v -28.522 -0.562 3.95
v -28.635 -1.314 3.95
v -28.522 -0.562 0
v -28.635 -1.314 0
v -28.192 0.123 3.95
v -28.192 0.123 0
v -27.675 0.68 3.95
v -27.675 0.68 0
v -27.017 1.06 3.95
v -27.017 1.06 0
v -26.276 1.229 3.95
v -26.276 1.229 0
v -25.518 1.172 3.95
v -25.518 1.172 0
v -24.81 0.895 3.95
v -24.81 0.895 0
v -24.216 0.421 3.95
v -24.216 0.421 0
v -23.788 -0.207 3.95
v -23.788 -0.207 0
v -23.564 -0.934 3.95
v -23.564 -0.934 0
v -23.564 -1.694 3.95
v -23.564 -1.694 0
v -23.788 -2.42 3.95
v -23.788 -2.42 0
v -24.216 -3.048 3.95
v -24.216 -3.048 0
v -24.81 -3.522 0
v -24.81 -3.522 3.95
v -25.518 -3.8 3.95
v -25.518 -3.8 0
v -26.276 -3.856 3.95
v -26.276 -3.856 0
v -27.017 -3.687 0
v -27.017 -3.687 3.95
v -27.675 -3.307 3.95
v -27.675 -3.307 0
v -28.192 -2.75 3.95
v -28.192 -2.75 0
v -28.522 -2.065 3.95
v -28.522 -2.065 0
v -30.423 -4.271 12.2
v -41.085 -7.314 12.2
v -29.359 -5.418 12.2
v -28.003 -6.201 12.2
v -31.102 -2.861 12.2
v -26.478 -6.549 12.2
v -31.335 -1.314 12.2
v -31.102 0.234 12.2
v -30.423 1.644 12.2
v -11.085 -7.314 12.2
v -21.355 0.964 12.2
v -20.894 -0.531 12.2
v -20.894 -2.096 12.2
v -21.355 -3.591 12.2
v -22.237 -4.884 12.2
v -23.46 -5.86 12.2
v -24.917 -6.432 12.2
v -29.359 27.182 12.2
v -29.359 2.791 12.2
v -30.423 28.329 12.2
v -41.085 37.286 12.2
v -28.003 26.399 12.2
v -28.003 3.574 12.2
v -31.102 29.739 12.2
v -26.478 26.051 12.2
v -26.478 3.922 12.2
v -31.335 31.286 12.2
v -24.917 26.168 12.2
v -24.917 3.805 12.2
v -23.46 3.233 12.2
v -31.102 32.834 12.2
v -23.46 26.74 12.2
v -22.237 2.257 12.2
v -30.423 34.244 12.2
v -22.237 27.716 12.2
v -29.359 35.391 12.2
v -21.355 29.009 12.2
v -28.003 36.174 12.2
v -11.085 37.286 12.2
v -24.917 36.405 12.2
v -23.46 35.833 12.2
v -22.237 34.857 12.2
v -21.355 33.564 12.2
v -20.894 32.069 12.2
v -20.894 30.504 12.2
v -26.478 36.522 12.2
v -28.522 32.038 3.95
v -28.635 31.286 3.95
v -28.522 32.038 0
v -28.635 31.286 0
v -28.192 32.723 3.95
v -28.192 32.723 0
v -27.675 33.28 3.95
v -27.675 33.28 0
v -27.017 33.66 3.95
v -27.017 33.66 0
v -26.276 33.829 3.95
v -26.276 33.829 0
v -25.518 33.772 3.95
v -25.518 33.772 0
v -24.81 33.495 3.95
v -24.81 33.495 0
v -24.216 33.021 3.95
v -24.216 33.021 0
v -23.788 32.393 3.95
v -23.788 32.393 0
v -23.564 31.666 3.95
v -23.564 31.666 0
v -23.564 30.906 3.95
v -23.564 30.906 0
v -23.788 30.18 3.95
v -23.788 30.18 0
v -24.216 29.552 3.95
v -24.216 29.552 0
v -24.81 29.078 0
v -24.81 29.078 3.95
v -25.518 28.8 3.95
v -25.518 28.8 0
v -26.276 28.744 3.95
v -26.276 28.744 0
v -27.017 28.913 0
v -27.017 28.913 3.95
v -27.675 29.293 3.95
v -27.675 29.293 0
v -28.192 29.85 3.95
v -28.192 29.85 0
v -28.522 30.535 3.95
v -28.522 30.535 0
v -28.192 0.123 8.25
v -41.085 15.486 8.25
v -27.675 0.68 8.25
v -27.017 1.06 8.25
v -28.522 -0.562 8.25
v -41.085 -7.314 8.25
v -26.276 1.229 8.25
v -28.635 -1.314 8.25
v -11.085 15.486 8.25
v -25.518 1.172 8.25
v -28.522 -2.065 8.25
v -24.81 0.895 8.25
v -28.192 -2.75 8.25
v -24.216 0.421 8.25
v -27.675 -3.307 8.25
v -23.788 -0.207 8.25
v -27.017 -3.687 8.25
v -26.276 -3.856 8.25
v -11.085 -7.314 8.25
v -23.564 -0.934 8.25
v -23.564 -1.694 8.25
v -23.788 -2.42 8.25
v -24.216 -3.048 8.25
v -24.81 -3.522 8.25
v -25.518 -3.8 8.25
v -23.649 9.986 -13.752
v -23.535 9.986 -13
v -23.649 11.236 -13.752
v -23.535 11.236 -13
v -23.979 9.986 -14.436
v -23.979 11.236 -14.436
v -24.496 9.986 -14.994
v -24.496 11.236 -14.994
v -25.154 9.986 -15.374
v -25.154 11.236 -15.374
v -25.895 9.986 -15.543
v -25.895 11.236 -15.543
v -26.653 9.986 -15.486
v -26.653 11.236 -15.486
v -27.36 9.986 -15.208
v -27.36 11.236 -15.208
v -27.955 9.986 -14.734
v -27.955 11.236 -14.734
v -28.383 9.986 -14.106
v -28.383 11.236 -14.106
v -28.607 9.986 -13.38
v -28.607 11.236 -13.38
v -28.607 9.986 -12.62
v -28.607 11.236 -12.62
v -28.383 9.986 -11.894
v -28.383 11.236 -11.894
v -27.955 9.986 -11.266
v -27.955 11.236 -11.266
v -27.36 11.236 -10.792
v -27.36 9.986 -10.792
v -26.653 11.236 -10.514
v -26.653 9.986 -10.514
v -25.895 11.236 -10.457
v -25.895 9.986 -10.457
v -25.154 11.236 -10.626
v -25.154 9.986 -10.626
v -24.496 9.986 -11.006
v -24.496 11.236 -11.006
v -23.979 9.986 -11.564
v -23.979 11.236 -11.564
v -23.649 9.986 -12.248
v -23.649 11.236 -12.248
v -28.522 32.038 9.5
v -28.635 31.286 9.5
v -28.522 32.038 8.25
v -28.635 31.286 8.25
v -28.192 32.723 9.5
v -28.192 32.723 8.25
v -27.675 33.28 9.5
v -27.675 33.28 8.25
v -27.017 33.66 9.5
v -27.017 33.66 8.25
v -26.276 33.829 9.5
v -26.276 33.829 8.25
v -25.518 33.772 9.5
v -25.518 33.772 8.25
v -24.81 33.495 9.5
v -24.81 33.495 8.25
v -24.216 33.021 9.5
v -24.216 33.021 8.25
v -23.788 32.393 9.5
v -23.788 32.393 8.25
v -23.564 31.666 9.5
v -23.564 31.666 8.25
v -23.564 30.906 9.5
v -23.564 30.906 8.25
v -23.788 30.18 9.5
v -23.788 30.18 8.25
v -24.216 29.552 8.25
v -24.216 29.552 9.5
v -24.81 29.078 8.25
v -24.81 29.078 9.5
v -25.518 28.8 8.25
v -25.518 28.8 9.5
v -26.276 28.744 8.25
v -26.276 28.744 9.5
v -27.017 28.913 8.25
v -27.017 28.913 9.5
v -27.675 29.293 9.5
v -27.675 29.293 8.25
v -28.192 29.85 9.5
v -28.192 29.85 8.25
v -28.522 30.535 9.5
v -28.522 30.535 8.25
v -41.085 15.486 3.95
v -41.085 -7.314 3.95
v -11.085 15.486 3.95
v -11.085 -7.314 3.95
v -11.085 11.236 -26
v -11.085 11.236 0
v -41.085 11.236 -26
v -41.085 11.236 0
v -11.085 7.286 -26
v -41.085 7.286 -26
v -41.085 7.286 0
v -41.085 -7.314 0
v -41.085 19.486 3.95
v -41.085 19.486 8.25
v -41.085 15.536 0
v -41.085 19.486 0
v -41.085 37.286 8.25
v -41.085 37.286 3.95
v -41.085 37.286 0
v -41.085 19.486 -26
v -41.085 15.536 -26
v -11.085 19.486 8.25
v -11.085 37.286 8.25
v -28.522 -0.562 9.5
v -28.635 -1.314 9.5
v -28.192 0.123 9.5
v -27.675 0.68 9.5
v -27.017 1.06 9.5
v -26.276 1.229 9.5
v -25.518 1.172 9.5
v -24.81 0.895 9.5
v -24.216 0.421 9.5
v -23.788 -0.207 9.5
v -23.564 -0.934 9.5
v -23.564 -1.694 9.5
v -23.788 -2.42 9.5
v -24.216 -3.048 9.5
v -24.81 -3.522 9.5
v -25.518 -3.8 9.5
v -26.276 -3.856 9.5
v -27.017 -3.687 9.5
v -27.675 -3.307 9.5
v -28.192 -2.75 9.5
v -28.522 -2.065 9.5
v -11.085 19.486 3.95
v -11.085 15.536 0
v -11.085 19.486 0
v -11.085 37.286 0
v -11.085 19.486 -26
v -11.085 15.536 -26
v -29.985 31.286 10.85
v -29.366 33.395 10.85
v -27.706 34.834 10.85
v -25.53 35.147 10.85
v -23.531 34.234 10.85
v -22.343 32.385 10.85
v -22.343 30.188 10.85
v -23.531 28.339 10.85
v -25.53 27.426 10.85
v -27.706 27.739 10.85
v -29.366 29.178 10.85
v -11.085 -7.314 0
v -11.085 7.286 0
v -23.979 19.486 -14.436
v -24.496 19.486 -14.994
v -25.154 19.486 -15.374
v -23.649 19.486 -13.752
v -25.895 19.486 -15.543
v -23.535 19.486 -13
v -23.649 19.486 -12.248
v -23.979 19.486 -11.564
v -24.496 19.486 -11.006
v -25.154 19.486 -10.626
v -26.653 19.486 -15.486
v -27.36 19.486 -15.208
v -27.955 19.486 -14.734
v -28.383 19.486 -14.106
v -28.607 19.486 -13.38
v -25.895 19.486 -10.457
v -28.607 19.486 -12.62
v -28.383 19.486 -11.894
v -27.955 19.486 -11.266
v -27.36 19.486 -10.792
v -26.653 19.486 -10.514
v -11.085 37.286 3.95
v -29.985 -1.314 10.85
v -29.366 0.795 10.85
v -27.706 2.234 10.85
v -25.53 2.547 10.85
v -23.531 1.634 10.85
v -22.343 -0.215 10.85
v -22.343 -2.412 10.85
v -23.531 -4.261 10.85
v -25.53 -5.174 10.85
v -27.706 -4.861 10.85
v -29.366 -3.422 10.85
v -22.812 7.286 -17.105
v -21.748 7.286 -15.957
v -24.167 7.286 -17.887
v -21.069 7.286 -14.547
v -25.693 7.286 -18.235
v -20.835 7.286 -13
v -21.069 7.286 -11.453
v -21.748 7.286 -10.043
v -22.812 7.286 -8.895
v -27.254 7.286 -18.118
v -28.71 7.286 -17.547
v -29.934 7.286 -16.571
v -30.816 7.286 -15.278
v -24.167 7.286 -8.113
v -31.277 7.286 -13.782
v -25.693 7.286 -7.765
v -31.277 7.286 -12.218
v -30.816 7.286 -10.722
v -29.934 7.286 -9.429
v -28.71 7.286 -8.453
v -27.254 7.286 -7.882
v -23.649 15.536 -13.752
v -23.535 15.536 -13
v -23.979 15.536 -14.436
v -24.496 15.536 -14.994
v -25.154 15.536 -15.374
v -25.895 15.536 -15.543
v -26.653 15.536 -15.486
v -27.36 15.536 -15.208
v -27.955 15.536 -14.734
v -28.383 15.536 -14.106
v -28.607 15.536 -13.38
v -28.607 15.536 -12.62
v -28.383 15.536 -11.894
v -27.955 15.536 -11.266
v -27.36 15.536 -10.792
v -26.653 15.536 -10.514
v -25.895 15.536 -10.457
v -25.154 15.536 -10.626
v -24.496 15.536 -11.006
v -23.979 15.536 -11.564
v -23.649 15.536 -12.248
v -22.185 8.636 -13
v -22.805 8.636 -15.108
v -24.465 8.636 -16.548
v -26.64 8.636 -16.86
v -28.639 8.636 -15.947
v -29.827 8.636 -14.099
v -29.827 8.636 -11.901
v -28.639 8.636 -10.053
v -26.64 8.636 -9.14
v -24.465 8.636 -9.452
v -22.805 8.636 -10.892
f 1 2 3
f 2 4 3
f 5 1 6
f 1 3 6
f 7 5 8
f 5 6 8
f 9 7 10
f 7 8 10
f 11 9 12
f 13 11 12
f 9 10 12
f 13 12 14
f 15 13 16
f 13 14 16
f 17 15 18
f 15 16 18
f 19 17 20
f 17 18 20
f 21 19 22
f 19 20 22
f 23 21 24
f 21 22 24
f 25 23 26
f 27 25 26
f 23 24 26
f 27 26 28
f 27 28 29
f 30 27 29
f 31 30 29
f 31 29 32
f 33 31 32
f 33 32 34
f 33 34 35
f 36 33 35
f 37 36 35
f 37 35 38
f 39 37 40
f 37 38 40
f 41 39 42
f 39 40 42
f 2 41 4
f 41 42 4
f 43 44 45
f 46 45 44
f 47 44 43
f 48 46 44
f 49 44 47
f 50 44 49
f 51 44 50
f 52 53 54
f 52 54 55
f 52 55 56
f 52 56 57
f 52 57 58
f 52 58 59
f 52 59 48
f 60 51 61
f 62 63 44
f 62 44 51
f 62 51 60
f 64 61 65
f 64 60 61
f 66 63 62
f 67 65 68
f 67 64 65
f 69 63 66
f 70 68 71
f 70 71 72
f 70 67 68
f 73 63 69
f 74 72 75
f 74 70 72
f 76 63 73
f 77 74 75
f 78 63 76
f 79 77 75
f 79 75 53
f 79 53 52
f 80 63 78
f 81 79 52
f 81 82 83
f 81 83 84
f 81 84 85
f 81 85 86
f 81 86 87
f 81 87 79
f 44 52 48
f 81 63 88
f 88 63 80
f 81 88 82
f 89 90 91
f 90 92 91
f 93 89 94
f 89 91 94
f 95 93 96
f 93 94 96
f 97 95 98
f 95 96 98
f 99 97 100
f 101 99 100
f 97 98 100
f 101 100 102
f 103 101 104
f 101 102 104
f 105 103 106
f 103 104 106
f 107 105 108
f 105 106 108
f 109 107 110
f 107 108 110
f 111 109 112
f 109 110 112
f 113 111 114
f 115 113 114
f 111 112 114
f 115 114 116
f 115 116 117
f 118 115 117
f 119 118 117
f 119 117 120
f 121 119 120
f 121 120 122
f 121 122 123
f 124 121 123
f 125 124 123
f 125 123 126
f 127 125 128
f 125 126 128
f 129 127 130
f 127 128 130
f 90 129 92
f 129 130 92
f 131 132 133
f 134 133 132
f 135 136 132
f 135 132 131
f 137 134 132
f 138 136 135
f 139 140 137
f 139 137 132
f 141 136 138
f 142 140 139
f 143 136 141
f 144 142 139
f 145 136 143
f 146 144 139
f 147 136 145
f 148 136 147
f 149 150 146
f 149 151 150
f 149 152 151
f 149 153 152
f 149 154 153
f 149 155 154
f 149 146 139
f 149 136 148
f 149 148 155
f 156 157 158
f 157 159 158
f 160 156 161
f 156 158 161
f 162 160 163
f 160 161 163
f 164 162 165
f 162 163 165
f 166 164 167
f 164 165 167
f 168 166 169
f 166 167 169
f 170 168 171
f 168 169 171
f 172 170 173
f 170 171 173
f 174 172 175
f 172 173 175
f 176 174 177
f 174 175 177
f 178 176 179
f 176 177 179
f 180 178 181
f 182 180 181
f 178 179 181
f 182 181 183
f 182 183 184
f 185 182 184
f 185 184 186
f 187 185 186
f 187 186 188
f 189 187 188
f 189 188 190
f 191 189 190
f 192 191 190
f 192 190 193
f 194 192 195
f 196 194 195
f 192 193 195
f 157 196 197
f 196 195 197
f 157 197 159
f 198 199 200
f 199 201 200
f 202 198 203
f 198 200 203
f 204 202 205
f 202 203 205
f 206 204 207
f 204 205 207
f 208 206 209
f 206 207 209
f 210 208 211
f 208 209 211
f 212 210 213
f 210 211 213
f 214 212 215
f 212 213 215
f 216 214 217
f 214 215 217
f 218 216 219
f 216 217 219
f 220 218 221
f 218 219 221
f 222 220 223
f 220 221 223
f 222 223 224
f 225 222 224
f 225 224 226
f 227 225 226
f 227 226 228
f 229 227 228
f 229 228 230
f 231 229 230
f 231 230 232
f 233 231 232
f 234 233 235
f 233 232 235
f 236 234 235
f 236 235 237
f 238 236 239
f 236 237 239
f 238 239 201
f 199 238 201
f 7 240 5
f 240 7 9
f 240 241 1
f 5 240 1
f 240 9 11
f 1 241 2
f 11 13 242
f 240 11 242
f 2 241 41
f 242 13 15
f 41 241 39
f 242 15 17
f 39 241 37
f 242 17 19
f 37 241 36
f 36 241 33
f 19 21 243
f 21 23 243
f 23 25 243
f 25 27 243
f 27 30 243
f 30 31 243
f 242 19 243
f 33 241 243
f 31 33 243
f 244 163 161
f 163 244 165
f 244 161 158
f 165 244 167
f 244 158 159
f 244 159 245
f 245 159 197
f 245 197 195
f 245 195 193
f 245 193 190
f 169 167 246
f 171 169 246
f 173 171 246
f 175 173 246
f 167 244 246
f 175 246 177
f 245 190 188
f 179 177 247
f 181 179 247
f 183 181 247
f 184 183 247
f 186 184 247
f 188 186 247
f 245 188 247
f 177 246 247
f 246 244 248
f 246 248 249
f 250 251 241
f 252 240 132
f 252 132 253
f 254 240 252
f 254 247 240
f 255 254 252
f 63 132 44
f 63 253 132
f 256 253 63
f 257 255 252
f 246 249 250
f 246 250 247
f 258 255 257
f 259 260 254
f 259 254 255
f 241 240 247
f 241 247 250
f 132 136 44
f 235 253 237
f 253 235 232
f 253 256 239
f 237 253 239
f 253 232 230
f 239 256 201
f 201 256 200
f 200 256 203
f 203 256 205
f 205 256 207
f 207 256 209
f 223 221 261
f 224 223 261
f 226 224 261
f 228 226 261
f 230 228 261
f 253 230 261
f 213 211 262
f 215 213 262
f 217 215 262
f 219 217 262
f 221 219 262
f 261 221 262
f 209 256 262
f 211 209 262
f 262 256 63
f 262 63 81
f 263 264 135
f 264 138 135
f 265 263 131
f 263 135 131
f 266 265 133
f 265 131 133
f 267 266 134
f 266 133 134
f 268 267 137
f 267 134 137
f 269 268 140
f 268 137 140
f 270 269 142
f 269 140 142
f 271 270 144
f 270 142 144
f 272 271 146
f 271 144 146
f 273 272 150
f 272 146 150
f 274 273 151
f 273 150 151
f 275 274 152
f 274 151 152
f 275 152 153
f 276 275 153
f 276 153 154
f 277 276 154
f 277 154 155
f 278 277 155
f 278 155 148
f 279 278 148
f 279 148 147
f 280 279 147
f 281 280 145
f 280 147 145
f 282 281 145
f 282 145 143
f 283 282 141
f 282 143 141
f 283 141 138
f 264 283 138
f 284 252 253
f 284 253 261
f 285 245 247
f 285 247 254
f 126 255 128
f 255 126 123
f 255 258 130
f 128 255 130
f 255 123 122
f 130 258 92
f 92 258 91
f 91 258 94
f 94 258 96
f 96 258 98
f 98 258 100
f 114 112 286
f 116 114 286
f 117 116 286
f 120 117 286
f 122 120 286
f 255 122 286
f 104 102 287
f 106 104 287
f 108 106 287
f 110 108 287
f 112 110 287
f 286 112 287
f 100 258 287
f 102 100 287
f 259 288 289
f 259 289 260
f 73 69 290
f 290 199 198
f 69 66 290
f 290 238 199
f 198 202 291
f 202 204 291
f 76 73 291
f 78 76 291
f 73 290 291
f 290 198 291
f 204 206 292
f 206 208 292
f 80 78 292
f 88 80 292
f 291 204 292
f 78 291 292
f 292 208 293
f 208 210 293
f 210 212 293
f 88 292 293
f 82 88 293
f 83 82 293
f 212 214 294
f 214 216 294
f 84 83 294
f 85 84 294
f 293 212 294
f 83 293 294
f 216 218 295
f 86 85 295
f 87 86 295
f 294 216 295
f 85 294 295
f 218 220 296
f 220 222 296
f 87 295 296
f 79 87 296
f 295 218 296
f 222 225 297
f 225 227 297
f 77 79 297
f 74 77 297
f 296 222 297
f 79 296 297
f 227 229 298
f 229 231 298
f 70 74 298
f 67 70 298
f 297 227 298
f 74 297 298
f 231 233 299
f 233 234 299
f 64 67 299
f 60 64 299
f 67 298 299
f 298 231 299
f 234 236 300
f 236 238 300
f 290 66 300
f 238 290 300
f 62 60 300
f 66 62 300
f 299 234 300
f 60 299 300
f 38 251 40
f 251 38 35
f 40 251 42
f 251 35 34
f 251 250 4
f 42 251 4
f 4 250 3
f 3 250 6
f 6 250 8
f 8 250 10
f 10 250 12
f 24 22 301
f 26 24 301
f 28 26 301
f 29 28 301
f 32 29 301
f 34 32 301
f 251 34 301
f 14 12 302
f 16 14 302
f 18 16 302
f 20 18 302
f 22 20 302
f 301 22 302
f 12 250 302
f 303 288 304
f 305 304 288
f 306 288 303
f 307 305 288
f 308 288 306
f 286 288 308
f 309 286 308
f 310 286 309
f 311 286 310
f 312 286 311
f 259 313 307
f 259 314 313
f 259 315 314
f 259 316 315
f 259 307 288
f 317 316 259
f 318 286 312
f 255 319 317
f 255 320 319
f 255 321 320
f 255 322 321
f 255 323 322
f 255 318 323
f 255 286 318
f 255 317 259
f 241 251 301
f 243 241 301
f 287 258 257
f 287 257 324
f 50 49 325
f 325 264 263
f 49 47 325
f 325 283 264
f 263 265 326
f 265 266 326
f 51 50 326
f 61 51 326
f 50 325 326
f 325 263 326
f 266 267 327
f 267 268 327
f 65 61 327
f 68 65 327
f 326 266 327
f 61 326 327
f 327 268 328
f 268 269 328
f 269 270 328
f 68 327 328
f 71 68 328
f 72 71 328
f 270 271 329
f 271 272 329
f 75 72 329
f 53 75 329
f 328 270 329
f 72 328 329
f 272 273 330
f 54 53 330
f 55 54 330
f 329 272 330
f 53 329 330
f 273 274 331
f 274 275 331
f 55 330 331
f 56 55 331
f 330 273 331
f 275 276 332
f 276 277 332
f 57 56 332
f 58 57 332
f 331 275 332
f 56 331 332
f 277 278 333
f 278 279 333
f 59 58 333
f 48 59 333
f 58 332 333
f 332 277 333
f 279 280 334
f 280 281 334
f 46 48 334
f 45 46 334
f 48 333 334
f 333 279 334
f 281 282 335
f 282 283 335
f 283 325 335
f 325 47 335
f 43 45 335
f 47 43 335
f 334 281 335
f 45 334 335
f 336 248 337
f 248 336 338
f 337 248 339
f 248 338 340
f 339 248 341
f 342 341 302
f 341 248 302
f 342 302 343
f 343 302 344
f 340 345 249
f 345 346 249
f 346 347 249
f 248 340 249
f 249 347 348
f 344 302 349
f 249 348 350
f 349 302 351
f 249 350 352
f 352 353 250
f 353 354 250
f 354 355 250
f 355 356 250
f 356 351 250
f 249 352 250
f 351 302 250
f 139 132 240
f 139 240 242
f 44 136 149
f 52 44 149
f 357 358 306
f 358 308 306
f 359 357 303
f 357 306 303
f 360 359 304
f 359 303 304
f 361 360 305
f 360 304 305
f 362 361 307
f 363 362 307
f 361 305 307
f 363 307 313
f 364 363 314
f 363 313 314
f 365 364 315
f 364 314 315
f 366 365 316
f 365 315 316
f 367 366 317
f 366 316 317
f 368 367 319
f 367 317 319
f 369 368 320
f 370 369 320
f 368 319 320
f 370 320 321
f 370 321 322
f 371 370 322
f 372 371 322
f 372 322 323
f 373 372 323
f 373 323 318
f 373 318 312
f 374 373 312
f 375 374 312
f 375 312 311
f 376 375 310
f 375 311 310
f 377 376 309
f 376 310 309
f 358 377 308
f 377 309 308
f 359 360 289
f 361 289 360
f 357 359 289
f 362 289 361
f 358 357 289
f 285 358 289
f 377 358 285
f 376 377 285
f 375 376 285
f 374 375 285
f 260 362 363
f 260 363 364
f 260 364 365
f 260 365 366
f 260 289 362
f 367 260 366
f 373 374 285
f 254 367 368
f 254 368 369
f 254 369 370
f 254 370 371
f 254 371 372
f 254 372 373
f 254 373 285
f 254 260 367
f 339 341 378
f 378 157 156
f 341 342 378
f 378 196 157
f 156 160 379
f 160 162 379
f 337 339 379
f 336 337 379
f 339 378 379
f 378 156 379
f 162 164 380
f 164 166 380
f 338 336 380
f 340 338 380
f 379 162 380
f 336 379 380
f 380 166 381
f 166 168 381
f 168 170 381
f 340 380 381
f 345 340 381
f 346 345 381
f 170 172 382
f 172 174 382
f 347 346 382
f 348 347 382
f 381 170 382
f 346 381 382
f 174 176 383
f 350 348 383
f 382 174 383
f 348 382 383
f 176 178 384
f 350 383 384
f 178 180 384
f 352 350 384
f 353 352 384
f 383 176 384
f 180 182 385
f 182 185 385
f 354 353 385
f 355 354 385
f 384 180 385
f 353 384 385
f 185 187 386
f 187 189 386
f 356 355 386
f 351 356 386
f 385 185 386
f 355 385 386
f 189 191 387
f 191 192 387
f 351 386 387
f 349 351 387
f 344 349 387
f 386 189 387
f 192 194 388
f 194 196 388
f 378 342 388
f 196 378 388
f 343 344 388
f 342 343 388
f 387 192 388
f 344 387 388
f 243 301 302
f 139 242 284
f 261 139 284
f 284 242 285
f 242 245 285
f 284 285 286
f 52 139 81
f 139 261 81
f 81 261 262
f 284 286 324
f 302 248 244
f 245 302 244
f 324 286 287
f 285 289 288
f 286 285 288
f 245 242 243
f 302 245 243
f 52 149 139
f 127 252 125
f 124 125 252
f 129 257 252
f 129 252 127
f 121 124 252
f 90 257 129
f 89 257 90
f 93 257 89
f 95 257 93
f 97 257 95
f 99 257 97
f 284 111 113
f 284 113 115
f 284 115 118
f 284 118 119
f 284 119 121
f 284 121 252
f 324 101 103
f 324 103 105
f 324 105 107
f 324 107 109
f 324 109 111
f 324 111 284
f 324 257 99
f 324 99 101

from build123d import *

# Parameters (mm, degrees)
ESQUISSE1_W                                       = 30
ESQUISSE1_H                                       = 44.6
BOSS_EXTRU_1_DEPTH                                = 12.2
ESQUISSE2_W                                       = 30
ESQUISSE2_H                                       = 4.3
ENL_V_MAT_EXTRU_1_DEPTH                           = 17.8
ESQUISSE3_W                                       = 30
ESQUISSE3_H                                       = 4.3
ENL_V_MAT_EXTRU_2_DEPTH                           = 22.8
FRAISAGE_POUR_VIS_T_TE_FRAIS_E_BOMB_E_D           = 5.09999996
FRAISAGE_POUR_VIS_T_TE_FRAIS_E_BOMB_E_CSINK_D     = 10.500000082
FRAISAGE_POUR_VIS_T_TE_FRAIS_E_BOMB_E_CSINK_ANGLE = 90
ESQUISSE6_W                                       = 30
ESQUISSE6_H                                       = 12.2
BOSS_EXTRU_2_DEPTH                                = 26
ESQUISSE7_W                                       = 26
ESQUISSE7_H                                       = 4.3
ENL_V_MAT_EXTRU_3_DEPTH                           = 31
FRAISAGE_POUR_VIS_T_TE_FRAIS_E_BOM_2_D            = 5.09999996
FRAISAGE_POUR_VIS_T_TE_FRAIS_E_BOM_2_CSINK_D      = 10.500000082
FRAISAGE_POUR_VIS_T_TE_FRAIS_E_BOM_2_CSINK_ANGLE  = 90


with BuildPart() as part:
    # Esquisse1 → Boss.-Extru.1 (new body)
    with BuildSketch(Plane.XY):
        with Locations((-26.085427136, 14.986432161)):
            Rectangle(ESQUISSE1_W, ESQUISSE1_H)
    extrude(amount=BOSS_EXTRU_1_DEPTH)

    # Esquisse2 → Enlèv. mat.-Extru.1 (cut)
    with BuildSketch(Plane(origin=(0, 37.286432161, 0), x_dir=(1, 0, 0), z_dir=(0, 1, 0))):
        with Locations((-26.085427136, -6.1)):
            Rectangle(ESQUISSE2_W, ESQUISSE2_H)
    extrude(amount=-ENL_V_MAT_EXTRU_1_DEPTH, mode=Mode.SUBTRACT)

    # Esquisse3 → Enlèv. mat.-Extru.2 (cut)
    with BuildSketch(Plane.XZ.offset(7.313567839)):
        with Locations((-26.085427136, 6.1)):
            Rectangle(ESQUISSE3_W, ESQUISSE3_H)
    extrude(amount=-ENL_V_MAT_EXTRU_2_DEPTH, mode=Mode.SUBTRACT)

    # Fraisage pour vis _ t_te frais_e bomb_e (through all)
    with Locations(Plane(origin=(-26.085427136, -1.313567839, 12.2), x_dir=(1, 0, 0), z_dir=(0, 0, 1))):
        with Locations((0, 0), (0, 32.6)):
            CounterSinkHole(FRAISAGE_POUR_VIS_T_TE_FRAIS_E_BOMB_E_D / 2, FRAISAGE_POUR_VIS_T_TE_FRAIS_E_BOMB_E_CSINK_D / 2, counter_sink_angle=FRAISAGE_POUR_VIS_T_TE_FRAIS_E_BOMB_E_CSINK_ANGLE)

    # Esquisse6 → Boss.-Extru.2 (add)
    with BuildSketch(Plane(origin=(0, 0, 0), x_dir=(-1, 0, 0), z_dir=(0, 0, -1))):
        with Locations((26.085427136, 13.386432161)):
            Rectangle(ESQUISSE6_W, ESQUISSE6_H)
    extrude(amount=BOSS_EXTRU_2_DEPTH)

    # Esquisse7 → Enlèv. mat.-Extru.3 (cut, through all)
    with BuildSketch(Plane.ZY.offset(41.085427136)):
        with Locations((-13, 13.386432161)):
            Rectangle(ESQUISSE7_W, ESQUISSE7_H)
    extrude(amount=-ENL_V_MAT_EXTRU_3_DEPTH, mode=Mode.SUBTRACT)

    # Fraisage pour vis _ t_te frais_e bom 2 (through all)
    with Locations(Plane(origin=(-26.085427136, 7.286432161, -13), x_dir=(-1, 0, 0), z_dir=(0, -1, 0))):
        with Locations((0, 0)):
            CounterSinkHole(FRAISAGE_POUR_VIS_T_TE_FRAIS_E_BOM_2_D / 2, FRAISAGE_POUR_VIS_T_TE_FRAIS_E_BOM_2_CSINK_D / 2, counter_sink_angle=FRAISAGE_POUR_VIS_T_TE_FRAIS_E_BOM_2_CSINK_ANGLE)


solid = part.part
